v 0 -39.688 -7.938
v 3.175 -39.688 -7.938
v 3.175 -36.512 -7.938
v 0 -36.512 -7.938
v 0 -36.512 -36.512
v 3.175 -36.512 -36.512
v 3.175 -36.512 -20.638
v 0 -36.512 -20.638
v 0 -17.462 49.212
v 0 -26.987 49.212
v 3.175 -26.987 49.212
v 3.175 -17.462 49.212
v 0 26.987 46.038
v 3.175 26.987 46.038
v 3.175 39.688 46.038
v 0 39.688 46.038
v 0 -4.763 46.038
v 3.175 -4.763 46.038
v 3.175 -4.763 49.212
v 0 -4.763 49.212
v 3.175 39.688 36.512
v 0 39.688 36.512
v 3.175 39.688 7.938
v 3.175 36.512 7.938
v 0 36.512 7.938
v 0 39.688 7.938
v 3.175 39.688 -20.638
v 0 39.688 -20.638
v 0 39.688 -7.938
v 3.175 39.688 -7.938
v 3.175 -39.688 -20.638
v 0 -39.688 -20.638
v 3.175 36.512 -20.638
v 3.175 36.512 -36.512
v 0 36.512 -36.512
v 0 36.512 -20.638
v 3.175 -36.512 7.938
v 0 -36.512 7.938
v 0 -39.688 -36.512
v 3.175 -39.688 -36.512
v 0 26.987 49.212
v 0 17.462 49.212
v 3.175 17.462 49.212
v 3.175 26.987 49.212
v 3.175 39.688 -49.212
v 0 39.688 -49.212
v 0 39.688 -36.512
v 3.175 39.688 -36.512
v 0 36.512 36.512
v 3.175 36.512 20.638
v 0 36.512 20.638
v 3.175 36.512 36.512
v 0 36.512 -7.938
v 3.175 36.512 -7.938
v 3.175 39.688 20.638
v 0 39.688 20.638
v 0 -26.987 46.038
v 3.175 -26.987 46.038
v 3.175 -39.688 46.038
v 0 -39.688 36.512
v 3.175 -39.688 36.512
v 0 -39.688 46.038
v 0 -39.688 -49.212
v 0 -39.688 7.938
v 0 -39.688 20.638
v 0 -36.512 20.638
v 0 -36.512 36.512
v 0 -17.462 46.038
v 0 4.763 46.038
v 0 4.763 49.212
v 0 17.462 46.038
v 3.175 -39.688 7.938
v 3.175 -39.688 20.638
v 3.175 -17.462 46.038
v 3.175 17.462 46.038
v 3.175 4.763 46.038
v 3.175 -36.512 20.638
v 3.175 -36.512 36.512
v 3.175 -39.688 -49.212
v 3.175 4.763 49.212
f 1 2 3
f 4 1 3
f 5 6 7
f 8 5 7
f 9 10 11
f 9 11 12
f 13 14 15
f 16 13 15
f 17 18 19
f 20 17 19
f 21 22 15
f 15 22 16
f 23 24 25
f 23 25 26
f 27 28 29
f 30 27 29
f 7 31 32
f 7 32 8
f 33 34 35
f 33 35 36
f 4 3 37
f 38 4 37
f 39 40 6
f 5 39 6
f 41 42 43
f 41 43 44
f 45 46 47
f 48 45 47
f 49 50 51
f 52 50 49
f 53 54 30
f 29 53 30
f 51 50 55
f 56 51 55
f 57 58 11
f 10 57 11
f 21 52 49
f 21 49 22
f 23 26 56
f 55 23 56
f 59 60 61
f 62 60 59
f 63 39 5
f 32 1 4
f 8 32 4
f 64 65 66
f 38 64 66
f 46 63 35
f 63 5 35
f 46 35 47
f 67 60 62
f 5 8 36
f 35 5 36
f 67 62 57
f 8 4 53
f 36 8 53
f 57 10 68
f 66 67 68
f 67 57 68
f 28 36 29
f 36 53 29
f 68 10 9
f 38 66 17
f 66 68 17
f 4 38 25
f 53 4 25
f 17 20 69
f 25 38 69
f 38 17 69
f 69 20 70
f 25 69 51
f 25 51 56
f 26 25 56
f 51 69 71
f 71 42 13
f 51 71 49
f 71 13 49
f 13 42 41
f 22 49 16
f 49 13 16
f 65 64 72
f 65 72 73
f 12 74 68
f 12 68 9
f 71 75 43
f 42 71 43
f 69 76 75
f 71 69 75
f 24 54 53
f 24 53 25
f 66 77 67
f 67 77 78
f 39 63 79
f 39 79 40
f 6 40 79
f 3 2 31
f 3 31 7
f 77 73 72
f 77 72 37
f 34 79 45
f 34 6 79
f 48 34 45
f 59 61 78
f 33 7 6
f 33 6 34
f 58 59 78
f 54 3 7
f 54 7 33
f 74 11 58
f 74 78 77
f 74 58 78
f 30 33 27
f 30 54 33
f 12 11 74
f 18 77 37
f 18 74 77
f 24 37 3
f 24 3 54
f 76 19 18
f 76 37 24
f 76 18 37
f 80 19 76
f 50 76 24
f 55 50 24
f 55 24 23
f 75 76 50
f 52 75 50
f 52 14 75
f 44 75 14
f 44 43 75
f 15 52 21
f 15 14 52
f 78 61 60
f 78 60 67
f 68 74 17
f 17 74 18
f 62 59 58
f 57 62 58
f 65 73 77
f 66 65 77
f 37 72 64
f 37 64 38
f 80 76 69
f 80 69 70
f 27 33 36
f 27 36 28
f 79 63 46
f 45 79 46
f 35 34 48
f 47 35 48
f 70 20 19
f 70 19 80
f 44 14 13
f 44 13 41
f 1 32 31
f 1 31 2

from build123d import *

# Parameters (mm, degrees)
F0_W     = 79.375
F0_H     = 98.425
F1_DEPTH = 3.175
F2_W     = 3.175
F2_H     = 15.875
F3_DEPTH = 3.176
F4_W     = 12.7
F4_H     = 3.175
F5_DEPTH = 3.176


with BuildPart() as f1:
    # F0 (on Right) → F1 (new body)
    with BuildSketch(Plane.YZ):
        Rectangle(F0_W, F0_H)
    extrude(amount=F1_DEPTH)

    # F2 (on face) → F3 (cut, through all)
    with BuildSketch(Plane.YZ.offset(3.175)):
        with Locations((-38.1, 28.575)):
            Rectangle(F2_W, F2_H)
        with Locations((-38.1, 0)):
            Rectangle(F2_W, F2_H)
        with Locations((-38.1, -28.575)):
            Rectangle(F2_W, F2_H)
        with Locations((38.1, 28.575)):
            Rectangle(F2_W, F2_H)
        with Locations((38.1, -28.575)):
            Rectangle(F2_W, F2_H)
        with Locations((38.1, 0)):
            Rectangle(F2_W, F2_H)
    extrude(amount=-F3_DEPTH, mode=Mode.SUBTRACT)

    # F4 (on face) → F5 (cut, through all)
    with BuildSketch(Plane.YZ.offset(3.175)):
        with Locations((-33.3375, 47.625)):
            Rectangle(F4_W, F4_H)
        with Locations((-11.1125, 47.625)):
            Rectangle(F4_W, F4_H)
        with Locations((11.1125, 47.625)):
            Rectangle(F4_W, F4_H)
        with Locations((33.3375, 47.625)):
            Rectangle(F4_W, F4_H)
    extrude(amount=-F5_DEPTH, mode=Mode.SUBTRACT)


solid = f1.part
